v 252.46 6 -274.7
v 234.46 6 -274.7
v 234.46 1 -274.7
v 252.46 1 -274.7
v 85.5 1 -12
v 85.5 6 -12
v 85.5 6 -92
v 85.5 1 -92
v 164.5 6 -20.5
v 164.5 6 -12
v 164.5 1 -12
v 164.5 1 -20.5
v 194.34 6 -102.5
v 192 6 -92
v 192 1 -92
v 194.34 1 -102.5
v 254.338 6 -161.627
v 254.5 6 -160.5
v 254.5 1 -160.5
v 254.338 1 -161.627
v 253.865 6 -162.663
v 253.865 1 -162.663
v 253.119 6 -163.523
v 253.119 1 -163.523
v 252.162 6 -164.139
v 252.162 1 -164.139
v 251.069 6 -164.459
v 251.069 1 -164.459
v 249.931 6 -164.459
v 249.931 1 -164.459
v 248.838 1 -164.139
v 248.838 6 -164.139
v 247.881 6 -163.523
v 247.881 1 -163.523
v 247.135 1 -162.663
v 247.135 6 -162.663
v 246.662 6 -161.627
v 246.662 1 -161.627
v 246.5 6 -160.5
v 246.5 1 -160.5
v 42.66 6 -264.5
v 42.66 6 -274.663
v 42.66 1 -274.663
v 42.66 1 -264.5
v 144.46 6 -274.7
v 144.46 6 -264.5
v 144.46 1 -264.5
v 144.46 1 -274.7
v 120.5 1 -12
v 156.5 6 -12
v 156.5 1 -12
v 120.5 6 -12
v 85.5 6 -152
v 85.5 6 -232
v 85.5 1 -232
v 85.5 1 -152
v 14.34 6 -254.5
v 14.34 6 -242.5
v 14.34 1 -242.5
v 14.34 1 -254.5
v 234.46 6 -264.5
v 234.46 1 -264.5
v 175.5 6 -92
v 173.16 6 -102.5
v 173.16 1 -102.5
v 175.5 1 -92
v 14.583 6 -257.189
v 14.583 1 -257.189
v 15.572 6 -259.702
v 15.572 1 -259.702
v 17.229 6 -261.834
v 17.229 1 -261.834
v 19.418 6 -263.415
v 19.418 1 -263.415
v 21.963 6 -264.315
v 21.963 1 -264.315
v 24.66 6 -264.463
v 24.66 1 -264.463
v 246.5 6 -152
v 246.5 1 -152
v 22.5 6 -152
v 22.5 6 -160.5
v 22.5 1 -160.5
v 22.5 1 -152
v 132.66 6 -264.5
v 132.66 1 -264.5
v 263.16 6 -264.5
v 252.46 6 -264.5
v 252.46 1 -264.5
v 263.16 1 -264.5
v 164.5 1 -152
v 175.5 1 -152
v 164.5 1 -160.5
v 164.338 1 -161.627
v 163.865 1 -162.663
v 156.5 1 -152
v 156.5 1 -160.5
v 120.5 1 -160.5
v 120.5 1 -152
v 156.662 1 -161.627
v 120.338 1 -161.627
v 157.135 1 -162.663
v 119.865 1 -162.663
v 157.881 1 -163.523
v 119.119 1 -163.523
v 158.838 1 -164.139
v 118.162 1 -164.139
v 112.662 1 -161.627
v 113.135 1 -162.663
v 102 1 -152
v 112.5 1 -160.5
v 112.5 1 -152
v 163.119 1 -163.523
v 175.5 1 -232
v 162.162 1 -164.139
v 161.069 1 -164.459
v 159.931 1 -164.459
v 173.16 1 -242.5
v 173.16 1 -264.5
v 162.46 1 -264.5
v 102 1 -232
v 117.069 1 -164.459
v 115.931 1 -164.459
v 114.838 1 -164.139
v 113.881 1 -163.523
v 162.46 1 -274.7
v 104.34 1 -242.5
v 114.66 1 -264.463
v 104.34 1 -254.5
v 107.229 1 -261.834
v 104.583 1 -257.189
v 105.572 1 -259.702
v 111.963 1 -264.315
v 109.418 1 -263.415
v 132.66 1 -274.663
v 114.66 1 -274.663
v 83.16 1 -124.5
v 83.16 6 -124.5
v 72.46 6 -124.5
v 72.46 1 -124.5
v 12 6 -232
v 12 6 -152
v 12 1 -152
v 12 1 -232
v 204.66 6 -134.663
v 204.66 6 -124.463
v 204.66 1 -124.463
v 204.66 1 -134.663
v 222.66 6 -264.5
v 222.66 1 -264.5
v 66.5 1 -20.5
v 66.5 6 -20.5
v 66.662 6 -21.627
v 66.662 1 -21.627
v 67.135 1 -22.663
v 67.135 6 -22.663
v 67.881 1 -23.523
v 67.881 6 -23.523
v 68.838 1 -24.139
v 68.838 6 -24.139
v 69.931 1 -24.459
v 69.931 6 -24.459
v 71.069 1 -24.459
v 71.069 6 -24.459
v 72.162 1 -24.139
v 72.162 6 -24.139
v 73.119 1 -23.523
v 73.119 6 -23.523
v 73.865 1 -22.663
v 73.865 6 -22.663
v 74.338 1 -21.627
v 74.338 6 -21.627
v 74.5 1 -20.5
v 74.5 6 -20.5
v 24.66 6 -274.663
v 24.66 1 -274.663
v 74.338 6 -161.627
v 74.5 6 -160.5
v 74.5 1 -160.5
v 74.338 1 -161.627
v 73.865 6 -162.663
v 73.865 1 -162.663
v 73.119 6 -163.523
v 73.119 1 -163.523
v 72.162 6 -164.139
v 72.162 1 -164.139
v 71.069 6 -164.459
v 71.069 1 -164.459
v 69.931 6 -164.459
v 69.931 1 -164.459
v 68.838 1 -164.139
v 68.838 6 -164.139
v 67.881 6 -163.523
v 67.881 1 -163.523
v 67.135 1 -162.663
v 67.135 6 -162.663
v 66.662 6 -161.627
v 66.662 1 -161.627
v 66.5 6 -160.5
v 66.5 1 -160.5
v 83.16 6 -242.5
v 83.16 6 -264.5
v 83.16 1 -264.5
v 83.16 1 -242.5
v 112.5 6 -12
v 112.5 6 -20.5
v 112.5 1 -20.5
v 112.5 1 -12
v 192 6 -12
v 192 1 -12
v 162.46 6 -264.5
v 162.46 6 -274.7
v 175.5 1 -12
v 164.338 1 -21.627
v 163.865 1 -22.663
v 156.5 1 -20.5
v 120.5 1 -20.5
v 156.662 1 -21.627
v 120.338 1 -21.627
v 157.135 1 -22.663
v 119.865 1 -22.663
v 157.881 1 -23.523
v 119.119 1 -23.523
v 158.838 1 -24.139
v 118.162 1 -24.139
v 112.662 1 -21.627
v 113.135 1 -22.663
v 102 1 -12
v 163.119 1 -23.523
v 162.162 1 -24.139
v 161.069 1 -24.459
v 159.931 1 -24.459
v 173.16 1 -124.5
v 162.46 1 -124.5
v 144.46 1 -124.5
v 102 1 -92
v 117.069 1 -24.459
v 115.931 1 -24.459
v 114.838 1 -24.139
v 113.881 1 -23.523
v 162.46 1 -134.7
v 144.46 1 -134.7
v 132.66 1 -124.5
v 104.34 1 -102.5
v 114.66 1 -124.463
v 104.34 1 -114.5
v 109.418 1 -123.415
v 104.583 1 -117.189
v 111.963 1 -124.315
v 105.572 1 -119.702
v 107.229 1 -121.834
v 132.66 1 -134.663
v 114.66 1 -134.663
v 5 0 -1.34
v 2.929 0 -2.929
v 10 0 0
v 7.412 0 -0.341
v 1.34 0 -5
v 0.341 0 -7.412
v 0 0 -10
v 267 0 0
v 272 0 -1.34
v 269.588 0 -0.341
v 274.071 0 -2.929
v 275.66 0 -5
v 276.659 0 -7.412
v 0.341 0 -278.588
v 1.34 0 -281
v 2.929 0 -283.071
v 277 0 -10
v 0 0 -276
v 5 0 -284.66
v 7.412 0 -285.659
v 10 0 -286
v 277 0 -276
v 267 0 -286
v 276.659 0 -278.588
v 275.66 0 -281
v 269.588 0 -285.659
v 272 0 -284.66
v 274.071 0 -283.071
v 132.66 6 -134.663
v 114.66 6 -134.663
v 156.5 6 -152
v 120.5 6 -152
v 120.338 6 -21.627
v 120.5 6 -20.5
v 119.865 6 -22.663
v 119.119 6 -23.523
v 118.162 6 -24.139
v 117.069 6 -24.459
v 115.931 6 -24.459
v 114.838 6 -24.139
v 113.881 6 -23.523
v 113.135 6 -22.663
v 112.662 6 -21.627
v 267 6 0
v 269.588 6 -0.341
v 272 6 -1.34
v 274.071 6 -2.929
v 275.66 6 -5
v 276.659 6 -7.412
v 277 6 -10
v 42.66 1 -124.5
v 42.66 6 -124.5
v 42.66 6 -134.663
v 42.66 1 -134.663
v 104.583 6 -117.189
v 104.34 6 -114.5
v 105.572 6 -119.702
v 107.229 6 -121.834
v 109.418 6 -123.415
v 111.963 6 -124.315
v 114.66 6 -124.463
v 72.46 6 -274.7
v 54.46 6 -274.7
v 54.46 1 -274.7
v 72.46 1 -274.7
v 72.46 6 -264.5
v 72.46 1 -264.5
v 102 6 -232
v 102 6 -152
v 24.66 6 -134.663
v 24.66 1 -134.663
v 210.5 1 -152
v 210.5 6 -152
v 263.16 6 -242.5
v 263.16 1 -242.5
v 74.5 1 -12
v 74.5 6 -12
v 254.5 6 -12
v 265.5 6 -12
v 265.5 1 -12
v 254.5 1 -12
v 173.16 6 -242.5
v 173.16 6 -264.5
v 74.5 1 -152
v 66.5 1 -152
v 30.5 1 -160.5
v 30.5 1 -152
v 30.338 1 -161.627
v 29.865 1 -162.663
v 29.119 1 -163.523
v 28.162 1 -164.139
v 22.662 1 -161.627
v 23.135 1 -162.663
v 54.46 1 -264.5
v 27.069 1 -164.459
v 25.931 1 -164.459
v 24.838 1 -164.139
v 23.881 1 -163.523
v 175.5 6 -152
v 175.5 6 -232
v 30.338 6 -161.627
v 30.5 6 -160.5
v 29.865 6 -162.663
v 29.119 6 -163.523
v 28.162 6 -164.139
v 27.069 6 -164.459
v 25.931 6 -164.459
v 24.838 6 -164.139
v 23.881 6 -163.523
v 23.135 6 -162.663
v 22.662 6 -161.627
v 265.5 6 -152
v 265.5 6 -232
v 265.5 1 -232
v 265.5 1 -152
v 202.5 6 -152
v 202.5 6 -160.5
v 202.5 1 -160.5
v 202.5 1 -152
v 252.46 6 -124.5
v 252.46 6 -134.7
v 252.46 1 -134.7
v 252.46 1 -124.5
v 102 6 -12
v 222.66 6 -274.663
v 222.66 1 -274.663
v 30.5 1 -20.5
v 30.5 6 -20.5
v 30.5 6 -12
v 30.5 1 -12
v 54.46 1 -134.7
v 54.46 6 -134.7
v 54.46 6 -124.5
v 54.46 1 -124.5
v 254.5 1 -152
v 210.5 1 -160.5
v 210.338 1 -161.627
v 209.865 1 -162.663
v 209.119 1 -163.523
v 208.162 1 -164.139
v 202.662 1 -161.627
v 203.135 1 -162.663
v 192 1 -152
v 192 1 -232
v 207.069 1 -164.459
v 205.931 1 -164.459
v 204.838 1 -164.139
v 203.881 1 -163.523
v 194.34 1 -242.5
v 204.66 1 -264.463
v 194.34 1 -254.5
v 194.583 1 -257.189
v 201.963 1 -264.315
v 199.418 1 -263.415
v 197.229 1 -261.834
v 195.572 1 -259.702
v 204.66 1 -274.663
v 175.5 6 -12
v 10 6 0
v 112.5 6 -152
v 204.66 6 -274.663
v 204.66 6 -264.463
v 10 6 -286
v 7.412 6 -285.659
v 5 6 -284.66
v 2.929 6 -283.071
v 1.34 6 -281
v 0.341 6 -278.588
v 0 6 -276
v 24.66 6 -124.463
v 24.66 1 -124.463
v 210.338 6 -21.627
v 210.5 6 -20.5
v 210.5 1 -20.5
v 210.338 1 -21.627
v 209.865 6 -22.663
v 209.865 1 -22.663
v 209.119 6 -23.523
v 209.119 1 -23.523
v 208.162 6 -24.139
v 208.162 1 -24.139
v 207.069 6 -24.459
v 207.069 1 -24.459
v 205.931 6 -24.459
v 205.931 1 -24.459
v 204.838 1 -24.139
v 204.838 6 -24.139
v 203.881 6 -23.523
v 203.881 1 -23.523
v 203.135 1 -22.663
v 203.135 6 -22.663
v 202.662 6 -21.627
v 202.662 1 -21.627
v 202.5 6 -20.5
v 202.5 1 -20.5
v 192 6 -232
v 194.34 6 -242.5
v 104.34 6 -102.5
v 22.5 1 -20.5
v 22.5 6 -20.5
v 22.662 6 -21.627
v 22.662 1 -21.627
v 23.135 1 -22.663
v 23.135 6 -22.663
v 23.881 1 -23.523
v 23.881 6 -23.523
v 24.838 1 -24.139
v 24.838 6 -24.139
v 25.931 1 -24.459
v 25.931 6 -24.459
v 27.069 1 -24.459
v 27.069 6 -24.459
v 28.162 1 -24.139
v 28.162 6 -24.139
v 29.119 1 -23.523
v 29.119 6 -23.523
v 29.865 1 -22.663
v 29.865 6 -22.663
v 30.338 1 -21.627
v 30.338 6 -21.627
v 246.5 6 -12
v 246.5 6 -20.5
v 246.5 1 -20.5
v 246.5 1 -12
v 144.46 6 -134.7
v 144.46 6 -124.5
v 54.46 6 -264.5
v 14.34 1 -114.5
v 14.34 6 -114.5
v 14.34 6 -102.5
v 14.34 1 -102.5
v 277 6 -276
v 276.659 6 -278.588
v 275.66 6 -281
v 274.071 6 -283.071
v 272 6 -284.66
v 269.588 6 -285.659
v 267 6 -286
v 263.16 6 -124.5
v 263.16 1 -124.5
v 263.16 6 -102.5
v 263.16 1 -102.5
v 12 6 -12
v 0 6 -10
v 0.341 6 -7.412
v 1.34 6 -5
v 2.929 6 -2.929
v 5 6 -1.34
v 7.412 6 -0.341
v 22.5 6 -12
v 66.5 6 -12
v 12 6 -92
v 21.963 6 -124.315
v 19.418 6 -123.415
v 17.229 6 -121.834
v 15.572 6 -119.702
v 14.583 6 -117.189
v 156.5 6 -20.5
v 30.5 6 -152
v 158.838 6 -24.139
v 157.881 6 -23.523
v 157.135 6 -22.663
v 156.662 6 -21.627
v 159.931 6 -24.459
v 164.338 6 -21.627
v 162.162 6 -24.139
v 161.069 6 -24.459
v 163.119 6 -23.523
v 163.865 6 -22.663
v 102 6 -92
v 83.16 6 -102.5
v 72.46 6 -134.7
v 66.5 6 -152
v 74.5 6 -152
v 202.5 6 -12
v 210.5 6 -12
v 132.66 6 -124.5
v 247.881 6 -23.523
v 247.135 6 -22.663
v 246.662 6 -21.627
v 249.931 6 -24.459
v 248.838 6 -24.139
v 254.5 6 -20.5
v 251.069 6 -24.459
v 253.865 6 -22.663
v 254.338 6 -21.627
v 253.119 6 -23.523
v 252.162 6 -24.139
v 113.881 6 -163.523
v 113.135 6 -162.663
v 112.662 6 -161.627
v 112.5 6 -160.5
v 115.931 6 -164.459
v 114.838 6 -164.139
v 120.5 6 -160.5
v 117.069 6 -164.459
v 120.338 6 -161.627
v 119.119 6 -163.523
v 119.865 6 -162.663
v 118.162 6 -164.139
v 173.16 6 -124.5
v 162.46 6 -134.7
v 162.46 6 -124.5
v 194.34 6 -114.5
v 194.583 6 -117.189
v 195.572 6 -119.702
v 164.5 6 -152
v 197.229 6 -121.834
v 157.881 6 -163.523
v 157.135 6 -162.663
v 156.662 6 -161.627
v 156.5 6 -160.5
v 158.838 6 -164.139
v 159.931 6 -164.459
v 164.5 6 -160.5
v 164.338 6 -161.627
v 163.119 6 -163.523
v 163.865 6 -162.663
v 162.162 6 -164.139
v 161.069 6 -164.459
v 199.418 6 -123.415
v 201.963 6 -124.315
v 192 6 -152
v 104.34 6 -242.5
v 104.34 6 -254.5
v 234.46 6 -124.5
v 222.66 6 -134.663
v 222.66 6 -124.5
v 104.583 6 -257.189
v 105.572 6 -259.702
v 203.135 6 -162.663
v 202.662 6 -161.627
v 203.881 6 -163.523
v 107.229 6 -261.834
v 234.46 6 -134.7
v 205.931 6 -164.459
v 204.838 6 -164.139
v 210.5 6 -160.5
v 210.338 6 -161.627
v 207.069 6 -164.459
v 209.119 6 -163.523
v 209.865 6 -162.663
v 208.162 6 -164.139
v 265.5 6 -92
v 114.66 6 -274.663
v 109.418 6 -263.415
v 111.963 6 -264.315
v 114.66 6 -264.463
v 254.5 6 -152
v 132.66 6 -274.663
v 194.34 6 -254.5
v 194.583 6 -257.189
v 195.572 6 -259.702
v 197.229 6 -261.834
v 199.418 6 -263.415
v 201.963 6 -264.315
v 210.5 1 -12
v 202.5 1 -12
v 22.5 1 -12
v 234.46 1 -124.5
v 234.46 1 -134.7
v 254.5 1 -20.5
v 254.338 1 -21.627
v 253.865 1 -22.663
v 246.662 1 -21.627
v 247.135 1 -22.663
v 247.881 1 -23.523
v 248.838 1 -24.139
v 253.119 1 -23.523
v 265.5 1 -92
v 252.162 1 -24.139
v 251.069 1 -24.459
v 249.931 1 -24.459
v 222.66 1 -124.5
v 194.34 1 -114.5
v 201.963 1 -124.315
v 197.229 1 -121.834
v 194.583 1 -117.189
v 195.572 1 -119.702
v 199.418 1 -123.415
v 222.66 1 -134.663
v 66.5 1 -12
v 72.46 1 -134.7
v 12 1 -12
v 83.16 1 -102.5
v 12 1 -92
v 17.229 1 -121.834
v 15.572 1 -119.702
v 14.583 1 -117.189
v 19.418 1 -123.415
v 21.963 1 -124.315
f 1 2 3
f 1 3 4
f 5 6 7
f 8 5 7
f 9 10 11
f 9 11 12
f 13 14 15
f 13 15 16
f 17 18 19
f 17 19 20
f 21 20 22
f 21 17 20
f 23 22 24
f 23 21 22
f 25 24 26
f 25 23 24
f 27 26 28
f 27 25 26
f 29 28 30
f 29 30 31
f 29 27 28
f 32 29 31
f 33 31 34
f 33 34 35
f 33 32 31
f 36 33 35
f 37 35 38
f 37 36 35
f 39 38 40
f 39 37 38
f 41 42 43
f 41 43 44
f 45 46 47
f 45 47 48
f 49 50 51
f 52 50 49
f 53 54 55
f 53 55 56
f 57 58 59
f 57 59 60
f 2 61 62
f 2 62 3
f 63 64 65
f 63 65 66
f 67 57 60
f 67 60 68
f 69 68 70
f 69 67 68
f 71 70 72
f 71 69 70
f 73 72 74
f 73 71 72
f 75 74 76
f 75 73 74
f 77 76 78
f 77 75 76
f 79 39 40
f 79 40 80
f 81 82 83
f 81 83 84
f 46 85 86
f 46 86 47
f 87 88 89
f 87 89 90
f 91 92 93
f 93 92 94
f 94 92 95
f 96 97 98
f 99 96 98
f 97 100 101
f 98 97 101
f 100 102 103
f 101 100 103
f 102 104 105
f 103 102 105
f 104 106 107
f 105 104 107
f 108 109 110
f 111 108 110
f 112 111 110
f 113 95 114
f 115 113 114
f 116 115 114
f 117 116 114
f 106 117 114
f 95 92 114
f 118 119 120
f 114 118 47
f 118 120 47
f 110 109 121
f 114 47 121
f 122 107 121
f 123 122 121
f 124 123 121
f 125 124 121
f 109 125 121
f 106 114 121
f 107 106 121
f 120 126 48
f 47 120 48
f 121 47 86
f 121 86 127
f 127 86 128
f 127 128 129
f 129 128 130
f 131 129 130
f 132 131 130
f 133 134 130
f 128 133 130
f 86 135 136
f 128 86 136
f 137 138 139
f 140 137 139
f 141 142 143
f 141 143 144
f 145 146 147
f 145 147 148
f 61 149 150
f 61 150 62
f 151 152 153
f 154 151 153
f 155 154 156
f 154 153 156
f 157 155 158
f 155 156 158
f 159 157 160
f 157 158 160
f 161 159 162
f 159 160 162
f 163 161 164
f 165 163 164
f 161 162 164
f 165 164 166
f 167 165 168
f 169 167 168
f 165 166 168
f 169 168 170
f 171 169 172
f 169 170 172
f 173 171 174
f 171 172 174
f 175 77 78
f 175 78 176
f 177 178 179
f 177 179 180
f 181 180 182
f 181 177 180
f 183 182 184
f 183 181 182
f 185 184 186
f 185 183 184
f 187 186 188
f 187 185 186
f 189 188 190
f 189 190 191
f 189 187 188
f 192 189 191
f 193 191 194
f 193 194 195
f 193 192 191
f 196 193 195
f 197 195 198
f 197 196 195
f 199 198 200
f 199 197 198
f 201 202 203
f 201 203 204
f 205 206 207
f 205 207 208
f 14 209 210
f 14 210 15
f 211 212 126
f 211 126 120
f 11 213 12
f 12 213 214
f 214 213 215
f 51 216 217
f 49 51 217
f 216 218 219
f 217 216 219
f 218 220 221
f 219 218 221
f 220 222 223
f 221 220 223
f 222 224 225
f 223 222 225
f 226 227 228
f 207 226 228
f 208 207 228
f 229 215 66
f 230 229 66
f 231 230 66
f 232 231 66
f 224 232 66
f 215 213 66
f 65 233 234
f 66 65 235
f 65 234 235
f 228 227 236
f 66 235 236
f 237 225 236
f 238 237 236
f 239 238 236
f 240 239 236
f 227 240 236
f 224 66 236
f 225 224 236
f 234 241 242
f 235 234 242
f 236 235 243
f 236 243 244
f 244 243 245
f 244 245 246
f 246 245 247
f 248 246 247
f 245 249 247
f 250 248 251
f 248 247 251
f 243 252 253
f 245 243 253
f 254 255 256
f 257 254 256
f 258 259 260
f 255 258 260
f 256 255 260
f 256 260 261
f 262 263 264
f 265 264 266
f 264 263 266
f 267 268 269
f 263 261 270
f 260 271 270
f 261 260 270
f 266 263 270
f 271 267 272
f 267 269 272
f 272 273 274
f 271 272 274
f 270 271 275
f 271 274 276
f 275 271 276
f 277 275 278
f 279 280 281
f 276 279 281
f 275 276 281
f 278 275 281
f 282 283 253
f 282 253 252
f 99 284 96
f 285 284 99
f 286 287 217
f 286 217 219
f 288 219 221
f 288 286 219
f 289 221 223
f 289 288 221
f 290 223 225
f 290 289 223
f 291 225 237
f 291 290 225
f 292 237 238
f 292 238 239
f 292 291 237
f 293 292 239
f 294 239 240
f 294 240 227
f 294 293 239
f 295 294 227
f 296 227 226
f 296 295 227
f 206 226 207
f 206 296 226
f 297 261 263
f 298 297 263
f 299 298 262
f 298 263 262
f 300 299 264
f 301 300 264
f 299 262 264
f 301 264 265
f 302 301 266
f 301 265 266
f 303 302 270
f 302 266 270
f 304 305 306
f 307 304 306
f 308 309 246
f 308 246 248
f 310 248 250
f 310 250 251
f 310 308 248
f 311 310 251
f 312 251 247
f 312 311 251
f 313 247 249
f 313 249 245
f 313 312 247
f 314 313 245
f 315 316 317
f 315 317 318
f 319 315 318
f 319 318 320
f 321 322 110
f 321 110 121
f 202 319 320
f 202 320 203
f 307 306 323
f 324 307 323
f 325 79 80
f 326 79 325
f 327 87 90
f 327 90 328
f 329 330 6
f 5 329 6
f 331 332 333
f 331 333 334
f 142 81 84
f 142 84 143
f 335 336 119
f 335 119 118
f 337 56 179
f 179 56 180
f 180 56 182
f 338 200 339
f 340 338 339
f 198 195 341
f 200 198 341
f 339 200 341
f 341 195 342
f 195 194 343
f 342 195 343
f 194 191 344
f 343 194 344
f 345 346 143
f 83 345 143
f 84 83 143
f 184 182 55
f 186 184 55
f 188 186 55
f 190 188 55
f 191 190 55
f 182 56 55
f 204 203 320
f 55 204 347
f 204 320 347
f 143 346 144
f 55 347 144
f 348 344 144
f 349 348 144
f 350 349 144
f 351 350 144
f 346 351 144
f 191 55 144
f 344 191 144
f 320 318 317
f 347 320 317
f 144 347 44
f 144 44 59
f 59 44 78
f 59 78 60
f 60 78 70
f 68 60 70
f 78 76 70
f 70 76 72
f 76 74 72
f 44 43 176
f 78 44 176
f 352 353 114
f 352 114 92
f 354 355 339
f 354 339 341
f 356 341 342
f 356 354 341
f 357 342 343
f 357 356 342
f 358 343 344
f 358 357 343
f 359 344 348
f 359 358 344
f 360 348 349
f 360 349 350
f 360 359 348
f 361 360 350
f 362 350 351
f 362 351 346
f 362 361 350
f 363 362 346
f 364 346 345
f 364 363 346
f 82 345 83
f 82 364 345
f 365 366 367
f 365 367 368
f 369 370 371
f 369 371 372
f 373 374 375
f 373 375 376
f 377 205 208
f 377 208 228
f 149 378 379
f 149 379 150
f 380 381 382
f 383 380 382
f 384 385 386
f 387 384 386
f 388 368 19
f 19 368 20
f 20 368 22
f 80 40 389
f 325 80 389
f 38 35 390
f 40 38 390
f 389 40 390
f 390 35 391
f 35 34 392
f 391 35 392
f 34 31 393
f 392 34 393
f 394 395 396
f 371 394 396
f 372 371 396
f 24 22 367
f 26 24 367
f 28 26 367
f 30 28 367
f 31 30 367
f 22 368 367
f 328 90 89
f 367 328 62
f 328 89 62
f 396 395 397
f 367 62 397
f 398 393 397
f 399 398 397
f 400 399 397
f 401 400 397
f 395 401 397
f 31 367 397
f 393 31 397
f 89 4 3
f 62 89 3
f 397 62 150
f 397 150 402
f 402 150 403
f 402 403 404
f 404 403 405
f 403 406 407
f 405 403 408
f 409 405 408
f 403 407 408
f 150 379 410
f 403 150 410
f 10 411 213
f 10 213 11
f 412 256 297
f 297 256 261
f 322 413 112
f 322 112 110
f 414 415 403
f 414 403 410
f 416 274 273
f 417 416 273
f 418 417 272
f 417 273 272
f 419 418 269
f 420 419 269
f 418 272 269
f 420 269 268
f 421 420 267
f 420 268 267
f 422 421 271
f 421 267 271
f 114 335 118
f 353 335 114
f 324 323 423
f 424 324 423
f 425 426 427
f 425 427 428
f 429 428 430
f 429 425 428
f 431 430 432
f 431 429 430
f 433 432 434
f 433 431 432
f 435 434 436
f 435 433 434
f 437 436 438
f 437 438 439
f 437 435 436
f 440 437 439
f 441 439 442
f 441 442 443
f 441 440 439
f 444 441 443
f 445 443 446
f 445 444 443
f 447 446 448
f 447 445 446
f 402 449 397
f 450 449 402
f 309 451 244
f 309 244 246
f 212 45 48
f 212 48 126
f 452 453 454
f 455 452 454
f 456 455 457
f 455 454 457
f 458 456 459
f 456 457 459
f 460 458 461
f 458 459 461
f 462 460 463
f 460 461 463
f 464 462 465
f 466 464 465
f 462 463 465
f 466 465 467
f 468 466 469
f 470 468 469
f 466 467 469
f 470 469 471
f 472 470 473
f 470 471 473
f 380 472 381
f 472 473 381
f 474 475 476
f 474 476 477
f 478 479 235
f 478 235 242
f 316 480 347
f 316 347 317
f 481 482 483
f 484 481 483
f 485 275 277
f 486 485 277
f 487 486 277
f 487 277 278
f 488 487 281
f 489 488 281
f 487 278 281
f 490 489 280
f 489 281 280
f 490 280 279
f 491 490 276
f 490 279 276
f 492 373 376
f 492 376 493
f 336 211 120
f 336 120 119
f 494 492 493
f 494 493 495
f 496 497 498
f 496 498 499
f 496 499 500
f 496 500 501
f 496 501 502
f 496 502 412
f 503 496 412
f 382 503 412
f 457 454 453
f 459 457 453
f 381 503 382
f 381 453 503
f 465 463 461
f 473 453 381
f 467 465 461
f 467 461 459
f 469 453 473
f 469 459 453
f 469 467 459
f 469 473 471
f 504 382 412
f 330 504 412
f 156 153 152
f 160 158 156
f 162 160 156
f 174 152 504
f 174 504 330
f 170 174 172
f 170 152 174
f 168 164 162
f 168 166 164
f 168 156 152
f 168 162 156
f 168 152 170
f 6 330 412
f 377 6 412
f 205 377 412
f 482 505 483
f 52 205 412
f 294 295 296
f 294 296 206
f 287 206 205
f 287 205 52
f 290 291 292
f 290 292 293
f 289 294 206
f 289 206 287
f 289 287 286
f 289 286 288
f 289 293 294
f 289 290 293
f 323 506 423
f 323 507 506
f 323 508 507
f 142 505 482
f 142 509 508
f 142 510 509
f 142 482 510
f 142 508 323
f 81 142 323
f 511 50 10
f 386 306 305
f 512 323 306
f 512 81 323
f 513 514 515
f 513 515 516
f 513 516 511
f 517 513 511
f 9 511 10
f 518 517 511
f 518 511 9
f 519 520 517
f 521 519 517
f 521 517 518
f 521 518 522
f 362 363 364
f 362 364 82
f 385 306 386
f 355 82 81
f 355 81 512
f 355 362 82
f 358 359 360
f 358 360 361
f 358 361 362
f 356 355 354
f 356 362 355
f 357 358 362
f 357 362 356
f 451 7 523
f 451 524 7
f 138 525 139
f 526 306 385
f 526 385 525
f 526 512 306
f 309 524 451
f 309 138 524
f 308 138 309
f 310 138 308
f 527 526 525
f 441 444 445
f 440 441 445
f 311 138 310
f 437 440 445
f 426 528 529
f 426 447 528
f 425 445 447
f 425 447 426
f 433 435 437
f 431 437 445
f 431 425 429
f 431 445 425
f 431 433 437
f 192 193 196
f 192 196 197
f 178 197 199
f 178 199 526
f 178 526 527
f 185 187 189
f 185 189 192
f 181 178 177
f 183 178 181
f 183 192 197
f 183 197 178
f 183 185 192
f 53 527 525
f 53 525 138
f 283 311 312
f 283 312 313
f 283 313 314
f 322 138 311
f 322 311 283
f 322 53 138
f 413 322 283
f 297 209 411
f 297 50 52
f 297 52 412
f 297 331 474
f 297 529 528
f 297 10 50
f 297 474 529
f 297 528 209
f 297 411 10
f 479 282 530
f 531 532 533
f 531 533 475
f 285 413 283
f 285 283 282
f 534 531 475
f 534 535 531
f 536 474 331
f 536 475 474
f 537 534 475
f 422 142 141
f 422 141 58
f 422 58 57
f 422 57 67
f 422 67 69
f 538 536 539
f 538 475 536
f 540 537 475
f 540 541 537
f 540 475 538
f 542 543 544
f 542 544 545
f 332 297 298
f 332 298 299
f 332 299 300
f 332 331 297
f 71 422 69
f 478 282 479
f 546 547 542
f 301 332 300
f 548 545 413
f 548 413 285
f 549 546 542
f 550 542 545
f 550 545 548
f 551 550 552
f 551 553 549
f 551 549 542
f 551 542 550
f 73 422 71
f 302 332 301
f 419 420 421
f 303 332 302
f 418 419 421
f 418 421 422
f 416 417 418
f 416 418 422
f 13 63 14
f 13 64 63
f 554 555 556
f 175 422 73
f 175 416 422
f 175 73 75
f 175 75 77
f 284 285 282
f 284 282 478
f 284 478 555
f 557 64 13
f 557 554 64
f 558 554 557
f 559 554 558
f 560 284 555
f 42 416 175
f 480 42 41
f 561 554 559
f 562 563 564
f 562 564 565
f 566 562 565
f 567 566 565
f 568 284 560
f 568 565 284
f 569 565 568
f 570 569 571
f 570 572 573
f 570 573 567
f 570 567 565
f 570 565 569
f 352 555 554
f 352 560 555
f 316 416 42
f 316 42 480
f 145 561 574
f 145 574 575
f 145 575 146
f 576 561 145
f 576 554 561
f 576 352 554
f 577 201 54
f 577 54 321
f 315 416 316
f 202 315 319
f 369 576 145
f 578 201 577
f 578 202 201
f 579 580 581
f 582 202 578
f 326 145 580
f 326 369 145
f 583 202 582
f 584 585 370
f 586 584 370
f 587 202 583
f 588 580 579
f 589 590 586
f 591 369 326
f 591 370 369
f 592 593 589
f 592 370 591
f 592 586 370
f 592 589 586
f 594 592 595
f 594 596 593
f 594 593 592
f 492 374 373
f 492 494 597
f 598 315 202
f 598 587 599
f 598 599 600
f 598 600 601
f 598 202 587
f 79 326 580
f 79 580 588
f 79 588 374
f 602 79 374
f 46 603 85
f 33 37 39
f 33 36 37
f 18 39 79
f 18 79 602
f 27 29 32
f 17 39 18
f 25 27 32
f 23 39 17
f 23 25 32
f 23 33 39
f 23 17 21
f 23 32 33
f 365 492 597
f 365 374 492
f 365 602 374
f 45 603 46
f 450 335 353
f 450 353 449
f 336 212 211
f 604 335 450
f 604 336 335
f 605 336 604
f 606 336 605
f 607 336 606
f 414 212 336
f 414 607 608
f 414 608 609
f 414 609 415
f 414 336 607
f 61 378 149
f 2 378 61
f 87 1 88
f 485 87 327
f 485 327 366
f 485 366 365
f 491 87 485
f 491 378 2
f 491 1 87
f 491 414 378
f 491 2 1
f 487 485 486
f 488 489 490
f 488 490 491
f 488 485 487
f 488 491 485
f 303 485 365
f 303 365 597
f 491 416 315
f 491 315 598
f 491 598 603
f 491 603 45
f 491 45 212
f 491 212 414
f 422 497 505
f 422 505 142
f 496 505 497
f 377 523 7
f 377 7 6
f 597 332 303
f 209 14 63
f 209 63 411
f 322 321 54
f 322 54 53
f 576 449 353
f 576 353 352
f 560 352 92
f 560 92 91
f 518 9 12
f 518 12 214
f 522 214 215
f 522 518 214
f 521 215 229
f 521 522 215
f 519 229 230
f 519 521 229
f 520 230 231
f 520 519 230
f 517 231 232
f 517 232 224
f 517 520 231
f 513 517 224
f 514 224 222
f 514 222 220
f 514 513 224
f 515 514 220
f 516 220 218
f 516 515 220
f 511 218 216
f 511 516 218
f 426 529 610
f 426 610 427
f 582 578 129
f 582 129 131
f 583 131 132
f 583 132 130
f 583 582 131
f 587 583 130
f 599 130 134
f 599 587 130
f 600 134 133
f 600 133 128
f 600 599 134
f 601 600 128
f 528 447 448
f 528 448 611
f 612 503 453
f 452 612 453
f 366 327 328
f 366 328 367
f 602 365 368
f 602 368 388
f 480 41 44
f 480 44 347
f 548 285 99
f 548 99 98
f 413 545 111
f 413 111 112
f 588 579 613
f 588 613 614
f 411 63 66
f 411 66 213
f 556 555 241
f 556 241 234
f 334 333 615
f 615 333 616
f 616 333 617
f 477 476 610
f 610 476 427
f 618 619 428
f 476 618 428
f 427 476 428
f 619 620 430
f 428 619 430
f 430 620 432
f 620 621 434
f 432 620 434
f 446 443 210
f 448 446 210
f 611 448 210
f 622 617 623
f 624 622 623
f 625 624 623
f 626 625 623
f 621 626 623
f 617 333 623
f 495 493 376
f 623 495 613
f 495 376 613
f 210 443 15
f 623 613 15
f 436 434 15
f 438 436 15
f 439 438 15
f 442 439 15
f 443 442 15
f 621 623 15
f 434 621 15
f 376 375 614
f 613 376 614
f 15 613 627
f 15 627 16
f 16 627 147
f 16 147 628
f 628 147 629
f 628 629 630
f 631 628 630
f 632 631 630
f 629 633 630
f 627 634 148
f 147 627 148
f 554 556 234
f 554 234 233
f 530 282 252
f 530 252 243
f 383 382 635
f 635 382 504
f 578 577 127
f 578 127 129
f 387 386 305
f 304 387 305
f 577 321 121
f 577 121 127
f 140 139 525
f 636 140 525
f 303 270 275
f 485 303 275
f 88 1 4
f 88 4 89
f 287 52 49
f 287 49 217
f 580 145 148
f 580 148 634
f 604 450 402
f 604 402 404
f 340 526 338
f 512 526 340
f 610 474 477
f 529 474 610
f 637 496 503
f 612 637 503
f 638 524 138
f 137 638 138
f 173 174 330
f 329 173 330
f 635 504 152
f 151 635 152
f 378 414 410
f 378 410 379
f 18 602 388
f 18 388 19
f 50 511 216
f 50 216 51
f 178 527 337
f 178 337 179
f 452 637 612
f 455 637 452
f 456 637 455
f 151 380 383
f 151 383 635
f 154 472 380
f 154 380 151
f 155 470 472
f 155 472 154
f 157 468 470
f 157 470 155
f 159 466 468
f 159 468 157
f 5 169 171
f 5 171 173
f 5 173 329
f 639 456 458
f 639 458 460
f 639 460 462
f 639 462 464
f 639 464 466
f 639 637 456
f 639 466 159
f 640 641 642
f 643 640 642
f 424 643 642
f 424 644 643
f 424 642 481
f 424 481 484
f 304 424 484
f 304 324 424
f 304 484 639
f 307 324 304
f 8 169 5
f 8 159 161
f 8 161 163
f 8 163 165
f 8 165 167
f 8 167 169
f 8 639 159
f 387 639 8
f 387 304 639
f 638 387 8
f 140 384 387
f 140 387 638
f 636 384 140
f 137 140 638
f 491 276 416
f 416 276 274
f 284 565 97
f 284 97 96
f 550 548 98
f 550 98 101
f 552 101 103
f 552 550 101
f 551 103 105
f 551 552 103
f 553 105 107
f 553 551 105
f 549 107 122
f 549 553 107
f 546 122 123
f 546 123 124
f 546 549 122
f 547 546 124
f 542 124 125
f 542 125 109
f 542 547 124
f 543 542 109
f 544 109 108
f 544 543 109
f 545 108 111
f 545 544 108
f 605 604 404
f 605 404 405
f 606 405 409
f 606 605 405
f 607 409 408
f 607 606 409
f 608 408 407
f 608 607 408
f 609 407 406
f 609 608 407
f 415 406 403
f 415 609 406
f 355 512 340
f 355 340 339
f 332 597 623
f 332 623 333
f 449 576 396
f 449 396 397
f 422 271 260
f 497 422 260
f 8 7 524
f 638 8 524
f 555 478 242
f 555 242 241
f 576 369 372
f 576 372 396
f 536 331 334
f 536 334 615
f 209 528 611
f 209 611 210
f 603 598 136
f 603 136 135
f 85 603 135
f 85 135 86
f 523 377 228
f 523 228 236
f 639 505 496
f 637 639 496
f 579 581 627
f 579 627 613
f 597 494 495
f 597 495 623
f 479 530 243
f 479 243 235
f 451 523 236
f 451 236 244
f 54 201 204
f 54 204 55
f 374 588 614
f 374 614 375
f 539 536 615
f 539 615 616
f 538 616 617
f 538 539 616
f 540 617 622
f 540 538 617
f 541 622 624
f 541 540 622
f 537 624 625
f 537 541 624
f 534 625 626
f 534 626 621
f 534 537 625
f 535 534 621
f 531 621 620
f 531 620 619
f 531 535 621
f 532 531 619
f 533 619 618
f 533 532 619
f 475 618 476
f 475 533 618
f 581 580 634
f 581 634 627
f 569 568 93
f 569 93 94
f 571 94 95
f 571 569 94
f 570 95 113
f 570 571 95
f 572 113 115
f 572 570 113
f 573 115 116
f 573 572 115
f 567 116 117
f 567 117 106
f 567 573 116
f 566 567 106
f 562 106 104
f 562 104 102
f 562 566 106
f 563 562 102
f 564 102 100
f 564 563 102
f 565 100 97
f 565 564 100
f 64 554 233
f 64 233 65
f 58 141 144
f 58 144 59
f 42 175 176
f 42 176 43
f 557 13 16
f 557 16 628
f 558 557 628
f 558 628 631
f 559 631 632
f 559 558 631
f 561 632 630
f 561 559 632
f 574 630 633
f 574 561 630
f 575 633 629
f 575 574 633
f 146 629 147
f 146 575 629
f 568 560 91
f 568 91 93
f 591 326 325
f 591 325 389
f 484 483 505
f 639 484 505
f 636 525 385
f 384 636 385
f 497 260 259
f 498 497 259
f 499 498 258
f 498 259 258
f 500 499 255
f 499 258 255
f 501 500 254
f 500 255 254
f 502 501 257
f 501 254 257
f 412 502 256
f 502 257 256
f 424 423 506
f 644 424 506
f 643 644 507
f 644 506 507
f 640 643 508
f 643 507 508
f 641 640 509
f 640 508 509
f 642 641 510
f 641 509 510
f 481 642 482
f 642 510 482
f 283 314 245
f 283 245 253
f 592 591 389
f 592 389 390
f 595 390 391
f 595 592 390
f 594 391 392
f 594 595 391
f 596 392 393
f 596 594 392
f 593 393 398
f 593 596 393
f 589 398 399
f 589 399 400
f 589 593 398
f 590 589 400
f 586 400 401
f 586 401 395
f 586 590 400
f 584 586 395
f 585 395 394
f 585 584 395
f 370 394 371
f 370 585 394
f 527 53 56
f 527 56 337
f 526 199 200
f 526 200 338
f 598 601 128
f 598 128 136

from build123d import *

# Parameters (mm, degrees)
BOSS_EXTRUDE1_DEPTH = 6
CUT_EXTRUDE1_DEPTH  = 5


with BuildPart() as part:
    # Sketch1 → Boss-Extrude1 (new body)
    with BuildSketch(Plane(origin=(0, 0, 0), x_dir=(1, 0, 0), z_dir=(0, 1, 0))):
        with BuildLine():
            Line((10, 0), (267, 0))
            ThreePointArc((267, 0), (274.071067812, 2.928932188), (277, 10))
            Line((277, 10), (277, 276))
            ThreePointArc((277, 276), (274.071067812, 283.071067812), (267, 286))
            Line((267, 286), (10, 286))
            ThreePointArc((10, 286), (2.928932188, 283.071067812), (0, 276))
            Line((0, 276), (0, 10))
            ThreePointArc((0, 10), (2.928932188, 2.928932188), (10, 0))
        make_face()
    extrude(amount=BOSS_EXTRUDE1_DEPTH)

    # Sketch2 → Cut-Extrude1 (cut)
    with BuildSketch(Plane(origin=(0, 6, 0), x_dir=(1, 0, 0), z_dir=(0, 1, 0))):
        with BuildLine():
            Line((12, 12), (22.5, 12))
            Line((22.5, 12), (22.5, 20.5))
            ThreePointArc((22.5, 20.5), (26.5, 24.5), (30.5, 20.5))
            Line((30.5, 20.5), (30.5, 12))
            Line((30.5, 12), (66.5, 12))
            Line((66.5, 12), (66.5, 20.5))
            ThreePointArc((66.5, 20.5), (70.5, 24.5), (74.5, 20.5))
            Line((74.5, 20.5), (74.5, 12))
            Line((74.5, 12), (85.5, 12))
            Line((85.5, 12), (85.5, 92))
            Line((85.5, 92), (83.159502005, 102.5))
            Line((83.159502005, 102.5), (83.159502005, 124.5))
            Line((83.159502005, 124.5), (72.459502005, 124.5))
            Line((72.459502005, 124.5), (72.459502005, 134.7))
            Line((72.459502005, 134.7), (54.459502005, 134.7))
            Line((54.459502005, 134.7), (54.459502005, 124.5))
            Line((54.459502005, 124.5), (42.659513404, 124.5))
            Line((42.659513404, 124.5), (42.659513404, 134.663480988))
            Line((42.659513404, 134.663480988), (24.659513404, 134.663480988))
            Line((24.659513404, 134.663480988), (24.659513404, 124.463480988))
            ThreePointArc((24.659513404, 124.463480988), (17.228582428, 121.834216678), (14.340497995, 114.5))
            Line((14.340497995, 114.5), (14.340497995, 102.5))
            Line((14.340497995, 102.5), (12, 92))
            Line((12, 92), (12, 12))
        make_face()
        with BuildLine():
            Line((114.659513404, 124.463480988), (114.659513404, 134.663480988))
            Line((114.659513404, 134.663480988), (132.659513404, 134.663480988))
            Line((132.659513404, 134.663480988), (132.659513404, 124.5))
            Line((132.659513404, 124.5), (144.459502005, 124.5))
            Line((144.459502005, 124.5), (144.459502005, 134.7))
            Line((144.459502005, 134.7), (162.459502005, 134.7))
            Line((162.459502005, 134.7), (162.459502005, 124.5))
            Line((162.459502005, 124.5), (173.159502005, 124.5))
            Line((173.159502005, 124.5), (173.159502005, 102.5))
            Line((173.159502005, 102.5), (175.5, 92))
            Line((175.5, 92), (175.5, 12))
            Line((175.5, 12), (164.5, 12))
            Line((164.5, 12), (164.5, 20.5))
            ThreePointArc((164.5, 20.5), (160.5, 24.5), (156.5, 20.5))
            Line((156.5, 20.5), (156.5, 12))
            Line((156.5, 12), (120.5, 12))
            Line((120.5, 12), (120.5, 20.5))
            ThreePointArc((120.5, 20.5), (116.5, 24.5), (112.5, 20.5))
            Line((112.5, 20.5), (112.5, 12))
            Line((112.5, 12), (102, 12))
            Line((102, 12), (102, 92))
            Line((102, 92), (104.340497995, 102.5))
            Line((104.340497995, 102.5), (104.340497995, 114.5))
            ThreePointArc((104.340497995, 114.5), (107.228582428, 121.834216678), (114.659513404, 124.463480988))
        make_face()
        with BuildLine():
            Line((204.659513404, 124.463480988), (204.659513404, 134.663480988))
            Line((204.659513404, 134.663480988), (222.659513404, 134.663480988))
            Line((222.659513404, 134.663480988), (222.659513404, 124.5))
            Line((222.659513404, 124.5), (234.459502005, 124.5))
            Line((234.459502005, 124.5), (234.459502005, 134.7))
            Line((234.459502005, 134.7), (252.459502005, 134.7))
            Line((252.459502005, 134.7), (252.459502005, 124.5))
            Line((252.459502005, 124.5), (263.159502005, 124.5))
            Line((263.159502005, 124.5), (263.159502005, 102.5))
            Line((263.159502005, 102.5), (265.5, 92))
            Line((265.5, 92), (265.5, 12))
            Line((265.5, 12), (254.5, 12))
            Line((254.5, 12), (254.5, 20.5))
            ThreePointArc((254.5, 20.5), (250.5, 24.5), (246.5, 20.5))
            Line((246.5, 20.5), (246.5, 12))
            Line((246.5, 12), (210.5, 12))
            Line((210.5, 12), (210.5, 20.5))
            ThreePointArc((210.5, 20.5), (206.5, 24.5), (202.5, 20.5))
            Line((202.5, 20.5), (202.5, 12))
            Line((202.5, 12), (192, 12))
            Line((192, 12), (192, 92))
            Line((192, 92), (194.340497995, 102.5))
            Line((194.340497995, 102.5), (194.340497995, 114.5))
            ThreePointArc((194.340497995, 114.5), (197.228582428, 121.834216678), (204.659513404, 124.463480988))
        make_face()
        with BuildLine():
            Line((114.659513404, 264.463480988), (114.659513404, 274.663480988))
            Line((114.659513404, 274.663480988), (132.659513404, 274.663480988))
            Line((132.659513404, 274.663480988), (132.659513404, 264.5))
            Line((132.659513404, 264.5), (144.459502005, 264.5))
            Line((144.459502005, 264.5), (144.459502005, 274.7))
            Line((144.459502005, 274.7), (162.459502005, 274.7))
            Line((162.459502005, 274.7), (162.459502005, 264.5))
            Line((162.459502005, 264.5), (173.159502005, 264.5))
            Line((173.159502005, 264.5), (173.159502005, 242.5))
            Line((173.159502005, 242.5), (175.5, 232))
            Line((175.5, 232), (175.5, 152))
            Line((175.5, 152), (164.5, 152))
            Line((164.5, 152), (164.5, 160.5))
            ThreePointArc((164.5, 160.5), (160.5, 164.5), (156.5, 160.5))
            Line((156.5, 160.5), (156.5, 152))
            Line((156.5, 152), (120.5, 152))
            Line((120.5, 152), (120.5, 160.5))
            ThreePointArc((120.5, 160.5), (116.5, 164.5), (112.5, 160.5))
            Line((112.5, 160.5), (112.5, 152))
            Line((112.5, 152), (102, 152))
            Line((102, 152), (102, 232))
            Line((102, 232), (104.340497995, 242.5))
            Line((104.340497995, 242.5), (104.340497995, 254.5))
            ThreePointArc((104.340497995, 254.5), (107.228582428, 261.834216678), (114.659513404, 264.463480988))
        make_face()
        with BuildLine():
            Line((204.659513404, 264.463480988), (204.659513404, 274.663480988))
            Line((204.659513404, 274.663480988), (222.659513404, 274.663480988))
            Line((222.659513404, 274.663480988), (222.659513404, 264.5))
            Line((222.659513404, 264.5), (234.459502005, 264.5))
            Line((234.459502005, 264.5), (234.459502005, 274.7))
            Line((234.459502005, 274.7), (252.459502005, 274.7))
            Line((252.459502005, 274.7), (252.459502005, 264.5))
            Line((252.459502005, 264.5), (263.159502005, 264.5))
            Line((263.159502005, 264.5), (263.159502005, 242.5))
            Line((263.159502005, 242.5), (265.5, 232))
            Line((265.5, 232), (265.5, 152))
            Line((265.5, 152), (254.5, 152))
            Line((254.5, 152), (254.5, 160.5))
            ThreePointArc((254.5, 160.5), (250.5, 164.5), (246.5, 160.5))
            Line((246.5, 160.5), (246.5, 152))
            Line((246.5, 152), (210.5, 152))
            Line((210.5, 152), (210.5, 160.5))
            ThreePointArc((210.5, 160.5), (206.5, 164.5), (202.5, 160.5))
            Line((202.5, 160.5), (202.5, 152))
            Line((202.5, 152), (192, 152))
            Line((192, 152), (192, 232))
            Line((192, 232), (194.340497995, 242.5))
            Line((194.340497995, 242.5), (194.340497995, 254.5))
            ThreePointArc((194.340497995, 254.5), (197.228582428, 261.834216678), (204.659513404, 264.463480988))
        make_face()
        with BuildLine():
            Line((24.659513404, 264.463480988), (24.659513404, 274.663480988))
            Line((24.659513404, 274.663480988), (42.659513404, 274.663480988))
            Line((42.659513404, 274.663480988), (42.659513404, 264.5))
            Line((42.659513404, 264.5), (54.459502005, 264.5))
            Line((54.459502005, 264.5), (54.459502005, 274.7))
            Line((54.459502005, 274.7), (72.459502005, 274.7))
            Line((72.459502005, 274.7), (72.459502005, 264.5))
            Line((72.459502005, 264.5), (83.159502005, 264.5))
            Line((83.159502005, 264.5), (83.159502005, 242.5))
            Line((83.159502005, 242.5), (85.5, 232))
            Line((85.5, 232), (85.5, 152))
            Line((85.5, 152), (74.5, 152))
            Line((74.5, 152), (74.5, 160.5))
            ThreePointArc((74.5, 160.5), (70.5, 164.5), (66.5, 160.5))
            Line((66.5, 160.5), (66.5, 152))
            Line((66.5, 152), (30.5, 152))
            Line((30.5, 152), (30.5, 160.5))
            ThreePointArc((30.5, 160.5), (26.5, 164.5), (22.5, 160.5))
            Line((22.5, 160.5), (22.5, 152))
            Line((22.5, 152), (12, 152))
            Line((12, 152), (12, 232))
            Line((12, 232), (14.340497995, 242.5))
            Line((14.340497995, 242.5), (14.340497995, 254.5))
            ThreePointArc((14.340497995, 254.5), (17.228582428, 261.834216678), (24.659513404, 264.463480988))
        make_face()
    extrude(amount=-CUT_EXTRUDE1_DEPTH, mode=Mode.SUBTRACT)


solid = part.part
